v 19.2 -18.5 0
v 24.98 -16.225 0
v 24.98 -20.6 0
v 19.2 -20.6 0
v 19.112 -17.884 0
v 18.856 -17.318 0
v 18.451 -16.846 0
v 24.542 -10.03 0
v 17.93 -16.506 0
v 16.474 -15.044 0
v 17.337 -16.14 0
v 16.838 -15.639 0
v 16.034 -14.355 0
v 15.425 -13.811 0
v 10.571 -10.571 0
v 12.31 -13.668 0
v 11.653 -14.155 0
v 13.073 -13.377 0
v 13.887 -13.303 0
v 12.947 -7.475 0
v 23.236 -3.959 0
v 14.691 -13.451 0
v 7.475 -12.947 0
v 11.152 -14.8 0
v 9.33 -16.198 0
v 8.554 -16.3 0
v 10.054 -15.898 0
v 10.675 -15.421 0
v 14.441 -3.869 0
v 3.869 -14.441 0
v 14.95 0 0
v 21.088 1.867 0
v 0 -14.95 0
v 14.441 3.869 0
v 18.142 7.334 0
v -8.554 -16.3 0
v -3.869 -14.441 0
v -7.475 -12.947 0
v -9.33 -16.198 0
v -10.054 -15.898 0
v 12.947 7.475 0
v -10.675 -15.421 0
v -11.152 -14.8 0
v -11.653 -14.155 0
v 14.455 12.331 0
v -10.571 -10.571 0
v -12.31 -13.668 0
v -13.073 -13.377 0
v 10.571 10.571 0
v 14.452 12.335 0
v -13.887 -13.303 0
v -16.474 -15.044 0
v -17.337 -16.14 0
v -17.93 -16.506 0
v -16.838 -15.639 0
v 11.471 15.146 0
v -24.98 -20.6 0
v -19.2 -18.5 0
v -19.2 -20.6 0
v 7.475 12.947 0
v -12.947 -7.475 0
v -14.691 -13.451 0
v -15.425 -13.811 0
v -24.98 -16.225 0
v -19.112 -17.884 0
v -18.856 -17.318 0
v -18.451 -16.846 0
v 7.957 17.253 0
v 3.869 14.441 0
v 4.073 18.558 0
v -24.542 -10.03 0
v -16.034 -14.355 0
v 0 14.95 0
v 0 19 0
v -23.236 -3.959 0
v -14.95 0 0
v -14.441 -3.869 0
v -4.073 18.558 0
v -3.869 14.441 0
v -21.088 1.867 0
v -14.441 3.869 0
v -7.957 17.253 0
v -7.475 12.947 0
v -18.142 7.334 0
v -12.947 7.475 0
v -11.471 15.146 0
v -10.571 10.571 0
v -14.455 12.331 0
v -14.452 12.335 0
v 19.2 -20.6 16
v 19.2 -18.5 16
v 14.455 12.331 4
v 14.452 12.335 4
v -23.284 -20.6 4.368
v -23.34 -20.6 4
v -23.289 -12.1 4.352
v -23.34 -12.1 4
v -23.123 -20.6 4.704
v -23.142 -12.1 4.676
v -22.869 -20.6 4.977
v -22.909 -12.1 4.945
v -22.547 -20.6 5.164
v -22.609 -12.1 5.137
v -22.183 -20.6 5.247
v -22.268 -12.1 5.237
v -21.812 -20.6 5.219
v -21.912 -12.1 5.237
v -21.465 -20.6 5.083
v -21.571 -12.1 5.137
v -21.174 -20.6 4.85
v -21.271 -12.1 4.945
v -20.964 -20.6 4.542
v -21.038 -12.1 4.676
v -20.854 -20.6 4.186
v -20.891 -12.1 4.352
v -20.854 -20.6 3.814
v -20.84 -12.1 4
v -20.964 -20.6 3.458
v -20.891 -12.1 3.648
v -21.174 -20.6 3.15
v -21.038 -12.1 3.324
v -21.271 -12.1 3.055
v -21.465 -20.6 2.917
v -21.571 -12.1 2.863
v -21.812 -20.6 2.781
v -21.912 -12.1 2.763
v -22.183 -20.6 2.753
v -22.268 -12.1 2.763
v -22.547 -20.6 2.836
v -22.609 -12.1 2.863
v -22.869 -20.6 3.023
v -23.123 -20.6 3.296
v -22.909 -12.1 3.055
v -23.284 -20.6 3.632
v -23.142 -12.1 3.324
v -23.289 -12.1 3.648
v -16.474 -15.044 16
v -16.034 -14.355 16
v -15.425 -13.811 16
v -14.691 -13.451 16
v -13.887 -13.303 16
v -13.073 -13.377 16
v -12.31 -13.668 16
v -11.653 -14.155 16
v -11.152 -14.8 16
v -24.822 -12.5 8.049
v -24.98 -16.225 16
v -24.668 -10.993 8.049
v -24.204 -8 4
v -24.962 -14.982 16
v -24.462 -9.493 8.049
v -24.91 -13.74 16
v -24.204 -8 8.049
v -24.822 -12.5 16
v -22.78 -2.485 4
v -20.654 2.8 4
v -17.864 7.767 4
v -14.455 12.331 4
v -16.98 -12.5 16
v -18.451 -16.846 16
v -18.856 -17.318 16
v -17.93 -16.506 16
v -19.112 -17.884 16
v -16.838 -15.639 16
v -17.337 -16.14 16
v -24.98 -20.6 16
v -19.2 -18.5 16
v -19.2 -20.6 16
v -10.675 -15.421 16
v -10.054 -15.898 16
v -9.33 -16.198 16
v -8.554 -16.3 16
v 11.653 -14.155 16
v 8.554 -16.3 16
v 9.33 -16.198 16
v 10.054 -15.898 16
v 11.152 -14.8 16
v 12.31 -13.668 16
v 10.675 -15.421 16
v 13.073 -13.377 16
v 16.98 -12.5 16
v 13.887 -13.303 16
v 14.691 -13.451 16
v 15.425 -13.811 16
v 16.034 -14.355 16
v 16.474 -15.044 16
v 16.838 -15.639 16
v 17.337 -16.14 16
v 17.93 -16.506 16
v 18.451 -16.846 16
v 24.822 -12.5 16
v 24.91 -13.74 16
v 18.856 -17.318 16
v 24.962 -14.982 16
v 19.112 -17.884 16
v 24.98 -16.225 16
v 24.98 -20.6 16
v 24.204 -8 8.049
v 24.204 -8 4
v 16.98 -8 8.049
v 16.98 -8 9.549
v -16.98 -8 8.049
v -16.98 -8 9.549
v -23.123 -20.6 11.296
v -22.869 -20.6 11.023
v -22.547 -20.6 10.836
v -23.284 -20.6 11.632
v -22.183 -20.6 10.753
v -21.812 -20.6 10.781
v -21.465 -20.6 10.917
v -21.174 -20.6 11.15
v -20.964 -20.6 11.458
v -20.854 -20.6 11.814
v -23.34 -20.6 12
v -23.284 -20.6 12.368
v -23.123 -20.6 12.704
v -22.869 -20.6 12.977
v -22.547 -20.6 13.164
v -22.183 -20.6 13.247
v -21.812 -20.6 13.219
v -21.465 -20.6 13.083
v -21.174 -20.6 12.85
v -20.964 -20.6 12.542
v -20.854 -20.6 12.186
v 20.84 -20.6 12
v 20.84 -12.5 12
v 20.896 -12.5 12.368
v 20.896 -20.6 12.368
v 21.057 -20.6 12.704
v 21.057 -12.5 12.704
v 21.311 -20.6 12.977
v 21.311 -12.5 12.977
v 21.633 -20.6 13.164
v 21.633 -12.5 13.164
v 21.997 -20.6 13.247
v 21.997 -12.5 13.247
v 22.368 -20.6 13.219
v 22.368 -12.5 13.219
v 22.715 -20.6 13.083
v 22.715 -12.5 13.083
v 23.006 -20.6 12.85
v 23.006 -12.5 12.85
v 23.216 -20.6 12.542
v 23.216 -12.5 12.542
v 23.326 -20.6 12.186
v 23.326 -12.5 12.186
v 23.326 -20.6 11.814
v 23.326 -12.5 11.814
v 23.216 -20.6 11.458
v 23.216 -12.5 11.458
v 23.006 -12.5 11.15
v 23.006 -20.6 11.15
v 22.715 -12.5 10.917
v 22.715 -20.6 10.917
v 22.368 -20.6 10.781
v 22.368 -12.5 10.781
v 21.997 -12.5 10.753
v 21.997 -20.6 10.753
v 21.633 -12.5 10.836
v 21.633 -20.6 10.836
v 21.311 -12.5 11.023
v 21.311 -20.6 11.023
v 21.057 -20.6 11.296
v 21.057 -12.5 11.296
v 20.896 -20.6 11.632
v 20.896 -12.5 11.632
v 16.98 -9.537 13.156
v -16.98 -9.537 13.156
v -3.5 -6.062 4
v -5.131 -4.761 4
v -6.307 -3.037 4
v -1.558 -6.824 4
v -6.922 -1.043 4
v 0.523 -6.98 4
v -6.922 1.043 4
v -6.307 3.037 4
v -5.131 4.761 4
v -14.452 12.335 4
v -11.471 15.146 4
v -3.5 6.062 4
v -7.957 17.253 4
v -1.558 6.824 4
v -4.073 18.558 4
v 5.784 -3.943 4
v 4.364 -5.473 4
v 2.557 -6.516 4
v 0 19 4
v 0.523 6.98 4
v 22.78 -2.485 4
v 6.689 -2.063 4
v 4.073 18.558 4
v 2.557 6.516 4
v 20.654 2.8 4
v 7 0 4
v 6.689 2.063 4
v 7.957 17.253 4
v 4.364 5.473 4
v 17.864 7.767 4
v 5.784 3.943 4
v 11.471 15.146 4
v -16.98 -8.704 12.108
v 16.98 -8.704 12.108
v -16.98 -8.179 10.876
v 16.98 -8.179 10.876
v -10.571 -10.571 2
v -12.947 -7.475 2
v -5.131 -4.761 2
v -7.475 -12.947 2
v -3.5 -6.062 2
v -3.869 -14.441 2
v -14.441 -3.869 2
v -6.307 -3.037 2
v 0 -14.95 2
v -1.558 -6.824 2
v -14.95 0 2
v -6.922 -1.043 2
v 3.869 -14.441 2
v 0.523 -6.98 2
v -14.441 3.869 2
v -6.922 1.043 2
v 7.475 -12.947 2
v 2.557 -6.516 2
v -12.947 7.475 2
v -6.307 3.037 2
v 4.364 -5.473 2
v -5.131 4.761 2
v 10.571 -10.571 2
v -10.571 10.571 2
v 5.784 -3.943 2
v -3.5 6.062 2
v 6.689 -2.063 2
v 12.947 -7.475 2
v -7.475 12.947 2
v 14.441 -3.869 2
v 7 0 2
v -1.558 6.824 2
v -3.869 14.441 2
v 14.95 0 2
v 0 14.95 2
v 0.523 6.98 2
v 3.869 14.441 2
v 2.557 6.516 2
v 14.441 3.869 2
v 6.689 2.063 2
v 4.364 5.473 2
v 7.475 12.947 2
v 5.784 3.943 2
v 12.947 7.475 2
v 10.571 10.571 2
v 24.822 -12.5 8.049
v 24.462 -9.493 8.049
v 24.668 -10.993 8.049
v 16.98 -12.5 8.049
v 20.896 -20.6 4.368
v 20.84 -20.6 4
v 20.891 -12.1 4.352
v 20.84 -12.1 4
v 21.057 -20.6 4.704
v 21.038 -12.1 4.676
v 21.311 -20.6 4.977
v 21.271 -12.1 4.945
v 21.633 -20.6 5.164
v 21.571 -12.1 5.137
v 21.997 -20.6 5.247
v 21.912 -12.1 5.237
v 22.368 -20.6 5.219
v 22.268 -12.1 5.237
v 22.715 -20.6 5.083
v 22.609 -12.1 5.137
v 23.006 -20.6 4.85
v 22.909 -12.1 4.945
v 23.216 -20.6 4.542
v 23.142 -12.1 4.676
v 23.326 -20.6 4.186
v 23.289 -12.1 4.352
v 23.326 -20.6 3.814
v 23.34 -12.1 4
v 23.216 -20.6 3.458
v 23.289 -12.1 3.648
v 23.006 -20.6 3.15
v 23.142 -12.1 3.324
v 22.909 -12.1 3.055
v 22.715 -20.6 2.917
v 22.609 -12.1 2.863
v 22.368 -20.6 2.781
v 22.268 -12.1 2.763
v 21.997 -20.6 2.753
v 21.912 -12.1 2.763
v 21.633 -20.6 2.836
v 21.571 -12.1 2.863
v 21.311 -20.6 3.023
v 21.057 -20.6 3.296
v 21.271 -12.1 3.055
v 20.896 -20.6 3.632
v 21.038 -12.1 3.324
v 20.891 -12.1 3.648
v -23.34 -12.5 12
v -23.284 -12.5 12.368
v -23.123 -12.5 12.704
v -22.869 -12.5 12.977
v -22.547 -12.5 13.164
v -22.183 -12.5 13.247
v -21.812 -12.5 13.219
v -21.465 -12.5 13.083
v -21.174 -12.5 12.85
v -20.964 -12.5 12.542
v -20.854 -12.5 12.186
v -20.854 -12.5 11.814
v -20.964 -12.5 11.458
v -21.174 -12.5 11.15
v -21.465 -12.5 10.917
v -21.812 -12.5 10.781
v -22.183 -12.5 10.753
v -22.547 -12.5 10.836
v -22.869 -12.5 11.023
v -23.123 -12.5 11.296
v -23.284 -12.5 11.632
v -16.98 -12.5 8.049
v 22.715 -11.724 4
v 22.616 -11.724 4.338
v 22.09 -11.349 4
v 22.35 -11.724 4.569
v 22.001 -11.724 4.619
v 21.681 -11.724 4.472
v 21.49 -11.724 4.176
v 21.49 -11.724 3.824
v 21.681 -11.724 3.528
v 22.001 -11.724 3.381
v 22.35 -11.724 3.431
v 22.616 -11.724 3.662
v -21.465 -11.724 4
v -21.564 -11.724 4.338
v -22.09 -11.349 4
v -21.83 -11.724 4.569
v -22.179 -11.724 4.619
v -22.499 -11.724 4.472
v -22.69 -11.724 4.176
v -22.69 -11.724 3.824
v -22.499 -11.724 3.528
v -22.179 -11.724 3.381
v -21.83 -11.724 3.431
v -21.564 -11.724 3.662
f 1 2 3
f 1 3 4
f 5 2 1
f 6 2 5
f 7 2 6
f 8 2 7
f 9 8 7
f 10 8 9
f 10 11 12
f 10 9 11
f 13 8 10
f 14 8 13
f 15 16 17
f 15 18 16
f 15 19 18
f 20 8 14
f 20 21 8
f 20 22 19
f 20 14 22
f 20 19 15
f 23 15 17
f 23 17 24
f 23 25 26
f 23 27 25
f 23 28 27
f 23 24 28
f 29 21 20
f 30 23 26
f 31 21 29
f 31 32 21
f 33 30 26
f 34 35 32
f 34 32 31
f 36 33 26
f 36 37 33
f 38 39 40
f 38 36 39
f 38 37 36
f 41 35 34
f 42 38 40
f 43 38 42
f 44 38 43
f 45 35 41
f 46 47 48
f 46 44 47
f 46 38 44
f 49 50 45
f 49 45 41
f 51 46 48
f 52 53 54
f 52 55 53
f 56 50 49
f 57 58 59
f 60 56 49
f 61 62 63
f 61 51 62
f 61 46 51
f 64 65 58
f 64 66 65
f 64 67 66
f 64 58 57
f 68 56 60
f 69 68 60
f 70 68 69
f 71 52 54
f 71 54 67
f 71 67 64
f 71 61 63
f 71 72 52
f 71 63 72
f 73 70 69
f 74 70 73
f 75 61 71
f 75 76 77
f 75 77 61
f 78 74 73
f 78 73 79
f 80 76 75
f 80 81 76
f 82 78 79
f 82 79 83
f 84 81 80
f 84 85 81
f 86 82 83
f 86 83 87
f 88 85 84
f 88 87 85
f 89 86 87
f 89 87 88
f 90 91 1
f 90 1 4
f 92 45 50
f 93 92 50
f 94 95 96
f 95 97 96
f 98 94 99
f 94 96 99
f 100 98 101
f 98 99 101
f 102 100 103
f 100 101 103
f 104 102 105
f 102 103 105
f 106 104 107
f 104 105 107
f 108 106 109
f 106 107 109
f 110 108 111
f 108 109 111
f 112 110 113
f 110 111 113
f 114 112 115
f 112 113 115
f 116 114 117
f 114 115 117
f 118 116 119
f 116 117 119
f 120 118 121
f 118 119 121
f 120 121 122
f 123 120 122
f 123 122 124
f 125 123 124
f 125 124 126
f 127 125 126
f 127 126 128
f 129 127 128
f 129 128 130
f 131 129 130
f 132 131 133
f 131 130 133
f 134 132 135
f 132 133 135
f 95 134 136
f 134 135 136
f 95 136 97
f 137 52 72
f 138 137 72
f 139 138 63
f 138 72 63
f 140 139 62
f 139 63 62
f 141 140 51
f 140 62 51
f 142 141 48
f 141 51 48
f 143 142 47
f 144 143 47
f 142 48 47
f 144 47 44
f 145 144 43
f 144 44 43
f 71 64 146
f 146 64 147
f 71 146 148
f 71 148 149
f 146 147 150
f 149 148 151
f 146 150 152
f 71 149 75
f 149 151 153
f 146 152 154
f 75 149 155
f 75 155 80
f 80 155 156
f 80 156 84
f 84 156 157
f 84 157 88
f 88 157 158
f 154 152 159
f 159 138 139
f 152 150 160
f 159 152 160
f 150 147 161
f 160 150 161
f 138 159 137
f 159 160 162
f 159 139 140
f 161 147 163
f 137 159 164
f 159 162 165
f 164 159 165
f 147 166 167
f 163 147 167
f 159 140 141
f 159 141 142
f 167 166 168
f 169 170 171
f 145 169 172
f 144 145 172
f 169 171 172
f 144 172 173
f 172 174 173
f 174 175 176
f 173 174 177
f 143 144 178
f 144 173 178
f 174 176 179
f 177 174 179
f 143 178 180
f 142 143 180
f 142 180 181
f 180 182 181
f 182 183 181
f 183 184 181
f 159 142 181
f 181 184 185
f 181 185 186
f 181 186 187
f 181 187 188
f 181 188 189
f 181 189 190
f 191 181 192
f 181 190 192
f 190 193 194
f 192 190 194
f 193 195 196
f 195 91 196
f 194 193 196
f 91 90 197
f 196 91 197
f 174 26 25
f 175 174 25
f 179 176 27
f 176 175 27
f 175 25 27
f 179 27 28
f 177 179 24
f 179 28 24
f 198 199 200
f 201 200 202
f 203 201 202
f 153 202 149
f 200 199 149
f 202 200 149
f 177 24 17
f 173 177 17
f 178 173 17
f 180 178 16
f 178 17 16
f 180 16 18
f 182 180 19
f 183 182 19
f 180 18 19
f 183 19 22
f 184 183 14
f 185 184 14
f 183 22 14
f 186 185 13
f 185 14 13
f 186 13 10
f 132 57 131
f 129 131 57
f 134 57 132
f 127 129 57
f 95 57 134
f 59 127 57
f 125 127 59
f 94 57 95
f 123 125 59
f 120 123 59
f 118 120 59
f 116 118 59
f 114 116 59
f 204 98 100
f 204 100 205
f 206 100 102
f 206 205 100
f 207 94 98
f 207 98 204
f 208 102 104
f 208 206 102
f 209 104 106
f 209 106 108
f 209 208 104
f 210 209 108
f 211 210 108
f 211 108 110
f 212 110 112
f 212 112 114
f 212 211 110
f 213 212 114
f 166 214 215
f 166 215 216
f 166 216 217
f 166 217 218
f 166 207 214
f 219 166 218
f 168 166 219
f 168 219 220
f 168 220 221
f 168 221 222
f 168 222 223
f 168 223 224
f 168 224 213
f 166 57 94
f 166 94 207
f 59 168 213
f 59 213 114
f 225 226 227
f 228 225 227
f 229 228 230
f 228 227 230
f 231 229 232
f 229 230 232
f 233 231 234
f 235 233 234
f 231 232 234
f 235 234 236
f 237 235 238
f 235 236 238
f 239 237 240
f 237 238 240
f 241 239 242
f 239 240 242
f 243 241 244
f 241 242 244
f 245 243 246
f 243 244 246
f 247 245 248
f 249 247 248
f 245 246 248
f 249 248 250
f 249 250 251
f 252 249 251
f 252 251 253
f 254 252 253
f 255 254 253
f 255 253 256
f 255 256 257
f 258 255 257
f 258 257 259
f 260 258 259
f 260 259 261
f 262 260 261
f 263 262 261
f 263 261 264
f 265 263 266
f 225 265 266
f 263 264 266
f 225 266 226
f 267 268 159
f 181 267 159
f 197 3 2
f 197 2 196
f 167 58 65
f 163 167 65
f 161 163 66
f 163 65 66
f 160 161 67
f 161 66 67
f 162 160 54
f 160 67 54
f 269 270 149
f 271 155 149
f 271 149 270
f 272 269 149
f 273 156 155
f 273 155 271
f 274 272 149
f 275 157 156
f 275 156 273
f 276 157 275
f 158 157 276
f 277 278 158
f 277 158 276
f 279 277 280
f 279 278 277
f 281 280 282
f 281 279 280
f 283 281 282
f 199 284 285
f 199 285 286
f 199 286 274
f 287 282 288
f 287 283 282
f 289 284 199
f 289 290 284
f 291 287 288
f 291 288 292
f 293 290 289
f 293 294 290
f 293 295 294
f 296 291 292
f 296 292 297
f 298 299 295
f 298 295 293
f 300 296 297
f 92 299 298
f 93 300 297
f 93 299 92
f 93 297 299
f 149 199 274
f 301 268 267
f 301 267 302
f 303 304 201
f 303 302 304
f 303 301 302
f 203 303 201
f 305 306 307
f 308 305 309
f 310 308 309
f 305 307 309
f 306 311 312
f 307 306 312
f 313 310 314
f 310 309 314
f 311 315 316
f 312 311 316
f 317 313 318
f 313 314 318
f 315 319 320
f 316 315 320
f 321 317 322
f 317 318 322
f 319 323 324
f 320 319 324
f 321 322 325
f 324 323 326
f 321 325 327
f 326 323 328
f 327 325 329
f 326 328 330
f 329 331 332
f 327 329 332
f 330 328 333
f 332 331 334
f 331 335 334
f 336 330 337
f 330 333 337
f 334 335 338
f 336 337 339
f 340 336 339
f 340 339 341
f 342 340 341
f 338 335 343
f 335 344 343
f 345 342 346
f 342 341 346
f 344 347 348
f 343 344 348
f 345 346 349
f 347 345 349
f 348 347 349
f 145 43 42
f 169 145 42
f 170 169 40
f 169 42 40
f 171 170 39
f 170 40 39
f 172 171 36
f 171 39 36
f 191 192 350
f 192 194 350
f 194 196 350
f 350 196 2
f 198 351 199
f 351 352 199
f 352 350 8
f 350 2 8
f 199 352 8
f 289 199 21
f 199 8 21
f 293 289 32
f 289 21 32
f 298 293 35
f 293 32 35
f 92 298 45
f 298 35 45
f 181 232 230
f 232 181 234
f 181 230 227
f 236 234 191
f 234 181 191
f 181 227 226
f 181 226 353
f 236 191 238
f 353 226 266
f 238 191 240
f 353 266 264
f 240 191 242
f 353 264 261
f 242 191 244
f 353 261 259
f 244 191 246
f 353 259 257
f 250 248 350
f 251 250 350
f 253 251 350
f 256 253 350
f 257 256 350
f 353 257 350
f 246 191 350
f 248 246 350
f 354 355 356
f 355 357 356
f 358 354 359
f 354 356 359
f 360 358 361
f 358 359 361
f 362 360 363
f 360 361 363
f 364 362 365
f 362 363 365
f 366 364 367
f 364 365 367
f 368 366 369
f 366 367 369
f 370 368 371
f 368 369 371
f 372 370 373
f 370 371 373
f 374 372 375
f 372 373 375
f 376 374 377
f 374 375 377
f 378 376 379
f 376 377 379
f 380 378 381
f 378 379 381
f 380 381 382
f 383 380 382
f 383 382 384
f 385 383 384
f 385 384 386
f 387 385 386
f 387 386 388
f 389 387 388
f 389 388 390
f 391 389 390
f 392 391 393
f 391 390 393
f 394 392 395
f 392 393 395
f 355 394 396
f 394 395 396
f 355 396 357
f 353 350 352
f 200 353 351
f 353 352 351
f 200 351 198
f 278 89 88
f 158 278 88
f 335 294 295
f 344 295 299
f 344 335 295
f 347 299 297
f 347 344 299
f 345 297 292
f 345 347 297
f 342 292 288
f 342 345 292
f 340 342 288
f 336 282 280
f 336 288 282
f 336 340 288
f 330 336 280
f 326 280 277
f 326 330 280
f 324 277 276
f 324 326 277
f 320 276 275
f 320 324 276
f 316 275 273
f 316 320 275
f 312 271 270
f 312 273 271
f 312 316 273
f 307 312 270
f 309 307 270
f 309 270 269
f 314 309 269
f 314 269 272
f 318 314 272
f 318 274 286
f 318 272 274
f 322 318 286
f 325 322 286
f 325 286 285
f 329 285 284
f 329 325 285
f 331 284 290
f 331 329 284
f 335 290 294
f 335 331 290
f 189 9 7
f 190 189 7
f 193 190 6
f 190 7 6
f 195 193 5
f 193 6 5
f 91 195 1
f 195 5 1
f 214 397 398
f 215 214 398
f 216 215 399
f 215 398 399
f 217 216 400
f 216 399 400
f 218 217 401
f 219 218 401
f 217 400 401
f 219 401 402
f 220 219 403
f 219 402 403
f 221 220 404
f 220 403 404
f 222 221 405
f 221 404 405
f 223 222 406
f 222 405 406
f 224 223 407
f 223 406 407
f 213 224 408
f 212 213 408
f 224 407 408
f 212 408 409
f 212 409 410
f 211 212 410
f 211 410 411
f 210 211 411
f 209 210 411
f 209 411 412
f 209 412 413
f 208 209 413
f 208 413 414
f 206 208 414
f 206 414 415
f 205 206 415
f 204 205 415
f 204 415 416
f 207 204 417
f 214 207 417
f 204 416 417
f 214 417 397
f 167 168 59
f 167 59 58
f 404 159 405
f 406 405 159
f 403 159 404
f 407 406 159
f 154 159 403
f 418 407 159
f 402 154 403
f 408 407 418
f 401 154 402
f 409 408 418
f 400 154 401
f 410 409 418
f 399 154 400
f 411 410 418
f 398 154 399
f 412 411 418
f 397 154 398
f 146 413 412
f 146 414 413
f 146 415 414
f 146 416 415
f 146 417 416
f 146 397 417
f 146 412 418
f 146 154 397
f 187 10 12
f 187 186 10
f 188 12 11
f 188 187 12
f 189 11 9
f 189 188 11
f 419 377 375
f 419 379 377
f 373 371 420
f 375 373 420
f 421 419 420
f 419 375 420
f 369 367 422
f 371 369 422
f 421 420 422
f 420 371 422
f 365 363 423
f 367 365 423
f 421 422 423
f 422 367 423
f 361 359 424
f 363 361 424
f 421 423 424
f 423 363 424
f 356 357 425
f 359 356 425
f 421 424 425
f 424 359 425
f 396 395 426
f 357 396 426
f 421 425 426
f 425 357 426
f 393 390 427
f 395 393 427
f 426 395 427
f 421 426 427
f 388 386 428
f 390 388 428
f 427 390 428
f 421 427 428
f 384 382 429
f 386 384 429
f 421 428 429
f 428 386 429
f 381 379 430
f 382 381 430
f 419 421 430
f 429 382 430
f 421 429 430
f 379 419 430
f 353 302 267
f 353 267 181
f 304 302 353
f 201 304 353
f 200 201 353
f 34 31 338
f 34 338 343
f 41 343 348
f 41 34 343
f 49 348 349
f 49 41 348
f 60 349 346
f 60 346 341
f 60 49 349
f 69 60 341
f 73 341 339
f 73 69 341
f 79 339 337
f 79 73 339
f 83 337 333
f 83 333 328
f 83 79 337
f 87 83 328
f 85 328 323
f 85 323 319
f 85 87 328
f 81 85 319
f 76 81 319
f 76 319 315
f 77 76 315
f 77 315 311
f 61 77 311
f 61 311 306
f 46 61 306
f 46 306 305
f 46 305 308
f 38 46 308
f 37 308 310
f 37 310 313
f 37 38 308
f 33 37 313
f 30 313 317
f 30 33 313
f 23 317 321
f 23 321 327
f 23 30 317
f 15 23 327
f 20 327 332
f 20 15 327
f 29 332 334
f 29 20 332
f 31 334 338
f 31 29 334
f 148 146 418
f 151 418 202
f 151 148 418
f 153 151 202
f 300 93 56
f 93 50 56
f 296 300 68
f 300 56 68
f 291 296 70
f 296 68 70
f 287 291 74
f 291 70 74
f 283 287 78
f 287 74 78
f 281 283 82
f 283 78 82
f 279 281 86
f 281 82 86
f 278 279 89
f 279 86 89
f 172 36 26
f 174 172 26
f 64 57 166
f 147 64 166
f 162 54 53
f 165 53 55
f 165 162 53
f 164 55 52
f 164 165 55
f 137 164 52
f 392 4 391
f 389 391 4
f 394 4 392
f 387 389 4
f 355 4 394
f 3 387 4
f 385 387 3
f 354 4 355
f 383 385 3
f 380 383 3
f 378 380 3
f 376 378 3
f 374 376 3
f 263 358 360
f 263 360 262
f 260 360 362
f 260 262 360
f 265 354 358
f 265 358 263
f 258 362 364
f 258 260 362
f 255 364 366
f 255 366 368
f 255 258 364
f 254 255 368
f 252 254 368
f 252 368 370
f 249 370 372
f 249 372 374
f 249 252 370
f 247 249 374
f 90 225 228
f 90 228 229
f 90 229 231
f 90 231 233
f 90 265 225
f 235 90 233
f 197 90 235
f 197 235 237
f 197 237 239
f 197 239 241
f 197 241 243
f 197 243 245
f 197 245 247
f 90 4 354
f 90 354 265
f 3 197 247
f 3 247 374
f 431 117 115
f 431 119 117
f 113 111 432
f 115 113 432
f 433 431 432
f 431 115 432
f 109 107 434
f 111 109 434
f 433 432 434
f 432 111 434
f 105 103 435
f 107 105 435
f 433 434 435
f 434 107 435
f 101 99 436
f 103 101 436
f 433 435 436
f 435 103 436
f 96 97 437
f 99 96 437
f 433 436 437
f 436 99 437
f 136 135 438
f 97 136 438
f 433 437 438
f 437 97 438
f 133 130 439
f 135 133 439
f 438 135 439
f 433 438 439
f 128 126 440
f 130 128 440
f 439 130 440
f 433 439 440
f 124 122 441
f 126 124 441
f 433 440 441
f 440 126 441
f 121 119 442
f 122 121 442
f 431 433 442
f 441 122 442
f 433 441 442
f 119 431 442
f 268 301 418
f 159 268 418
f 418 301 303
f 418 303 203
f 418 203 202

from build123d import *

# Parameters (mm, degrees)
ESBO_O1_R                     = 14.95
RESSALTO_EXTRUS_O1_DEPTH      = 2
ESBO_O2_R                     = 7
RESSALTO_EXTRUS_O2_DEPTH      = 2
ESBO_O3_W                     = 49.96
ESBO_O3_H                     = 12
RESSALTO_EXTRUS_O3_DEPTH      = 8.1
CHANFRO1_SIZE                 = 12.5
CHANFRO1_SIZE_2               = 12
FILETE1_R                     = 44
CORTE_EXTRUS_O1_REACH         = 38.116
CORTE_EXTRUS_O2_DEPTH         = 37.115930003
ESBO_O7_W                     = 49.64413541
ESBO_O7_H                     = 12
CORTE_EXTRUS_O5_DEPTH         = 8
FILETE2_R                     = 5
FURO_ROSCADO_DE_M3X0_51_D     = 2.5
FURO_ROSCADO_DE_M3X0_51_DEPTH = 8.5
FURO_ROSCADO_DE_M3X0_51_TIP   = 0.751075774
CORTE_EXTRUS_O6_DEPTH         = 8
FILETE3_R                     = 3


with BuildPart() as part:
    # Esboço1 → Ressalto-extrusão1 (new body)
    with BuildSketch(Plane.XY):
        with BuildLine():
            Line((-24.98, -20.6), (-24.98, 0))
            Line((-24.98, 0), (-14.451561249, 12.33500618))
            ThreePointArc((-14.451561249, 12.33500618), (0, 19), (14.451561249, 12.33500618))
            Line((14.451561249, 12.33500618), (24.98, 0))
            Line((24.98, 0), (24.98, -20.6))
            Line((24.98, -20.6), (18.98, -20.6))
            Line((18.98, -20.6), (-18.98, -20.6))
            Line((-18.98, -20.6), (-24.98, -20.6))
        make_face()
        Circle(ESBO_O1_R, mode=Mode.SUBTRACT)
    extrude(amount=RESSALTO_EXTRUS_O1_DEPTH)

    # Esboço2 → Ressalto-extrusão2 (add)
    with BuildSketch(Plane.XY.offset(2)):
        with BuildLine():
            Line((24.98, 0), (14.451561249, 12.33500618))
            ThreePointArc((14.451561249, 12.33500618), (0, 19), (-14.451561249, 12.33500618))
            Line((-14.451561249, 12.33500618), (-24.98, 0))
            Line((-24.98, 0), (-24.98, -20.6))
            Line((-24.98, -20.6), (24.98, -20.6))
            Line((24.98, -20.6), (24.98, 0))
        make_face()
        Circle(ESBO_O2_R, mode=Mode.SUBTRACT)
    extrude(amount=RESSALTO_EXTRUS_O2_DEPTH)

    # Esboço3 → Ressalto-extrusão3 (add)
    with BuildSketch(Plane.XZ.offset(20.6)):
        with Locations((0, 10)):
            Rectangle(ESBO_O3_W, ESBO_O3_H)
    extrude(amount=-RESSALTO_EXTRUS_O3_DEPTH)

    # Chanfro1
    # the kernel refuses this chamfer: 12.5, 12 mm, written as the material it adds along each edge
    with BuildSketch(Plane(origin=(-24.98, -12.5, 4), x_dir=(-1.156063365908983e-15, 0.9996377364334812, -0.026914603808079415), z_dir=(1, 0, 0))) as chanfro1_piece_1_section:
        Polygon((CHANFRO1_SIZE * 0.999637736433, CHANFRO1_SIZE * 0.0269146038081), (-CHANFRO1_SIZE_2 * 0.0269146038081, CHANFRO1_SIZE_2 * 0.999637736433), (0, 0), align=None)
    chanfro1_piece_1 = extrude(amount=49.96, mode=Mode.PRIVATE)
    chanfro1_piece_1 = chanfro1_piece_1 - Plane(origin=(0, 0, 8.125756992), x_dir=(1, 0, 0), z_dir=(0, 0, -1)) * Cylinder(7, 150, mode=Mode.PRIVATE)
    add(chanfro1_piece_1)

    # Filete1
    # the kernel refuses this fillet: 44 mm, written as the material it takes off along each edge
    with BuildSketch(Plane(origin=(-24.98, 0, 44.561650607), x_dir=(0.6492108903913877, 0.7606084536719413, 0), z_dir=(0, 0, -1)), Plane(origin=(24.98, 0, -40.561650607), x_dir=(-0.6492108903913875, 0.7606084536719414, 0), z_dir=(0, 0, 1))) as filete1_piece_1:
        with BuildLine():
            CenterArc((16.224665438, 43.999998084), FILETE1_R, 229.517867219, 40.465225033)
            Line((-12.340613739, 10.533226123), (-15.197141656, 7.186548926))
            Line((-15.197141656, 7.186548926), (-1.622466416, -4.399999917))
            Line((-1.622466416, -4.399999917), (16.210382799, -4.399999808))
            Line((16.210382799, -4.399999808), (16.211681221, 0))
        make_face()
    extrude(amount=85.123301215, mode=Mode.SUBTRACT)

    # Esboço4 → Corte-extrusão1 (cut, up to next)
    with BuildSketch(Plane.XY.offset(16), mode=Mode.PRIVATE) as corte_extrus_o1_sk1:
        with BuildLine():
            Line((17, -16.5), (-17, -16.5))
            ThreePointArc((-17, -16.5), (-18.414213562, -17.085786438), (-19, -18.5))
            Line((-19, -18.5), (-19, -20.6))
            Line((-19, -20.6), (19, -20.6))
            Line((19, -20.6), (19, -18.5))
            ThreePointArc((19, -18.5), (18.414213562, -17.085786438), (17, -16.5))
        make_face()
    corte_extrus_o1_tool1 = extrude(corte_extrus_o1_sk1.sketch, amount=-CORTE_EXTRUS_O1_REACH, mode=Mode.PRIVATE) & part.part
    add(corte_extrus_o1_tool1.solids().sort_by_distance((0, -18.567864, 16))[0], mode=Mode.SUBTRACT)

    # Esboço6 → Corte-extrusão2 (cut, through all)
    with BuildSketch(Plane(origin=(0, 0, 0), x_dir=(-1, 0, 0), z_dir=(0, 0, -1))):
        with BuildLine():
            Line((17, -16.3), (16.75, -16.3))
            ThreePointArc((16.75, -16.3), (14.526457135, -13.402222521), (11.151923789, -14.8))
            ThreePointArc((11.151923789, -14.8), (10.053847577, -15.898076211), (8.553847577, -16.3))
            Line((8.553847577, -16.3), (-8.553847577, -16.3))
            ThreePointArc((-8.553847577, -16.3), (-10.053847577, -15.898076211), (-11.151923789, -14.8))
            ThreePointArc((-11.151923789, -14.8), (-14.526457135, -13.402222521), (-16.75, -16.3))
            Line((-16.75, -16.3), (-17, -16.3))
            ThreePointArc((-17, -16.3), (-18.555634919, -16.944365081), (-19.2, -18.5))
            Line((-19.2, -18.5), (-19.2, -20.6))
            Line((-19.2, -20.6), (19.2, -20.6))
            Line((19.2, -20.6), (19.2, -18.5))
            ThreePointArc((19.2, -18.5), (18.555634919, -16.944365081), (17, -16.3))
        make_face()
    extrude(amount=-CORTE_EXTRUS_O2_DEPTH, mode=Mode.SUBTRACT)

    # Esboço7 → Corte-extrusão5 (cut)
    with BuildSketch(Plane(origin=(0, 0, 0), x_dir=(-1, 0, 0), z_dir=(0, -1, 0))):
        with Locations((0, -10)):
            Rectangle(ESBO_O7_W, ESBO_O7_H)
    extrude(amount=CORTE_EXTRUS_O5_DEPTH, mode=Mode.SUBTRACT)

    # Filete2
    filete2_edges = [part.edges().sort_by_distance(p)[0] for p in [
        (0, -8, 11.68),
    ]]
    fillet(filete2_edges, radius=FILETE2_R)

    # Furo roscado de M3x0.51
    with Locations(Plane.XZ.offset(20.6)):
        with Locations((22.09, 4), (22.09, 12), (-22.09, 4), (-22.09, 12)):
            Hole(FURO_ROSCADO_DE_M3X0_51_D / 2, depth=FURO_ROSCADO_DE_M3X0_51_DEPTH)
            with Locations((0, 0, -(FURO_ROSCADO_DE_M3X0_51_DEPTH + FURO_ROSCADO_DE_M3X0_51_TIP / 2))):  # 118° drill point
                Cone(0, FURO_ROSCADO_DE_M3X0_51_D / 2, FURO_ROSCADO_DE_M3X0_51_TIP, mode=Mode.SUBTRACT)

    # Esboço12 → Corte-extrusão6 (cut)
    with BuildSketch(Plane(origin=(24.98, 0, 0), x_dir=(0, 0, -1), z_dir=(1, 0, 0))):
        with BuildLine():
            Line((-9.54891062, -12.5), (-8.04891062, -12.5))
            Line((-8.04891062, -12.5), (-8.04891062, -8))
            Line((-8.04891062, -8), (-9.54891062, -8))
            ThreePointArc((-9.54891062, -8), (-11.509357545, -8.400364378), (-13.155847225, -9.537340859))
            Line((-13.155847225, -9.537340859), (-16, -12.5))
            Line((-16, -12.5), (-9.54891062, -12.5))
        make_face()
    corte_extrus_o6 = extrude(amount=-CORTE_EXTRUS_O6_DEPTH, mode=Mode.SUBTRACT)

    # Espelhar1: Corte-extrusão6 across plane
    add(corte_extrus_o6.mirror(Plane(origin=(0, 0, 0), x_dir=(0, 0, 1), z_dir=(1, 0, 0))), mode=Mode.SUBTRACT)

    # Filete3
    filete3_edges = [part.edges().sort_by_distance(p)[0] for p in [
        (16.75, -16.3, 8),
        (-16.75, -16.3, 8),
    ]]
    fillet(filete3_edges, radius=FILETE3_R)


solid = part.part
